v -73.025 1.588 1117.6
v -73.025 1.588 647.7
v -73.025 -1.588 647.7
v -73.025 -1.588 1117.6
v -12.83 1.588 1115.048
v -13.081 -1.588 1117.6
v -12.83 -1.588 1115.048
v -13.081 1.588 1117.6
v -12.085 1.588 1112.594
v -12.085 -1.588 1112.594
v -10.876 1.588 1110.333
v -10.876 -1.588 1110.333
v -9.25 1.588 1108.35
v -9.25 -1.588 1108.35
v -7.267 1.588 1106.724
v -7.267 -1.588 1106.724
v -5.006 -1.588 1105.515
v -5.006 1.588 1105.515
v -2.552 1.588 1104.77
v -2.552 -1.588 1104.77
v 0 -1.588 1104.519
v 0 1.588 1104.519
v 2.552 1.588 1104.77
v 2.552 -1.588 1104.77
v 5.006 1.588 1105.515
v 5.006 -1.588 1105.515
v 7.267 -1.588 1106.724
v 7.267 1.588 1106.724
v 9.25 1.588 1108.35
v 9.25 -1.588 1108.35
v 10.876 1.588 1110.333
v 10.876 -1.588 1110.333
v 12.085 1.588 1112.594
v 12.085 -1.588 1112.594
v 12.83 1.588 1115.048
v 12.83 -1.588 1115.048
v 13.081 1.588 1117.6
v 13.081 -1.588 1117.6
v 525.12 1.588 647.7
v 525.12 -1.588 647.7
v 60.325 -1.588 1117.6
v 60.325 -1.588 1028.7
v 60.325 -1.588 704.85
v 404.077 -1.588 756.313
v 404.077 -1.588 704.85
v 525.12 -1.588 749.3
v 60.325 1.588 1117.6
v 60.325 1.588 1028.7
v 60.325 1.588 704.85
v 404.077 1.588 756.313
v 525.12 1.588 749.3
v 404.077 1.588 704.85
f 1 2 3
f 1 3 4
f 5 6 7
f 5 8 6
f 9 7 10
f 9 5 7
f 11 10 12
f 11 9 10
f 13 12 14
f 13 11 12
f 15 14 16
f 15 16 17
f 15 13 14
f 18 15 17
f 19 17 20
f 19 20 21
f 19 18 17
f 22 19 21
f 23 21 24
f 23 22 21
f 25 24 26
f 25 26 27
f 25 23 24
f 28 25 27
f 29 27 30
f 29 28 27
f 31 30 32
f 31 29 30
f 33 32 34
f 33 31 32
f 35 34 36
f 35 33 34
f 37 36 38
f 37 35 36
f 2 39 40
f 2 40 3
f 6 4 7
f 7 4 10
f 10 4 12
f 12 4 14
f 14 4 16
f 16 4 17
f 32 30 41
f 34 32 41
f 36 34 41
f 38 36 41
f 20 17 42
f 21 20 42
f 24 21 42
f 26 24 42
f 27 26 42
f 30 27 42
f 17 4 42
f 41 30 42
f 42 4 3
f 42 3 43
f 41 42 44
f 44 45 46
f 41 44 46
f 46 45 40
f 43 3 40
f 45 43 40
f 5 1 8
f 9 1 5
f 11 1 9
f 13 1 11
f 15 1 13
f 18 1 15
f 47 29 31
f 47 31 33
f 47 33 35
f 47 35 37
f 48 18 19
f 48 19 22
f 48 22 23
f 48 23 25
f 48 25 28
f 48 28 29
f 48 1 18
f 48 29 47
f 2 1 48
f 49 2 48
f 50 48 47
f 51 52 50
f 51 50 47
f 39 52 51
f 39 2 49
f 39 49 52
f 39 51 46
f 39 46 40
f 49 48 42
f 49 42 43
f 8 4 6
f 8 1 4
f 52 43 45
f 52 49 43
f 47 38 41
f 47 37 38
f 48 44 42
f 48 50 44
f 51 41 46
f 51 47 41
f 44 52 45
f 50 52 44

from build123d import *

# Parameters (mm, degrees)
BOSS_EXTRUDE1_DEPTH = 1.5875


with BuildPart() as part:
    # Sketch1 → Boss-Extrude1 (new, symmetric)
    with BuildSketch(Plane(origin=(0, 0, 0), x_dir=(1, 0, 0), z_dir=(0, 1, 0))):
        with BuildLine():
            Line((60.325, -1117.6), (525.1196, -749.3))
            Line((525.1196, -749.3), (525.1196, -647.7))
            Line((525.1196, -647.7), (-73.025, -647.7))
            Line((-73.025, -647.7), (-73.025, -1117.6))
            Line((-73.025, -1117.6), (-13.081, -1117.6))
            ThreePointArc((-13.081, -1117.6), (0, -1104.519), (13.081, -1117.6))
            Line((13.081, -1117.6), (60.325, -1117.6))
        make_face()
        Polygon((60.325, -1028.7), (60.325, -704.85), (404.076843973, -704.85), (404.076843973, -756.313435837), align=None, mode=Mode.SUBTRACT)
    extrude(amount=BOSS_EXTRUDE1_DEPTH, both=True)


solid = part.part
